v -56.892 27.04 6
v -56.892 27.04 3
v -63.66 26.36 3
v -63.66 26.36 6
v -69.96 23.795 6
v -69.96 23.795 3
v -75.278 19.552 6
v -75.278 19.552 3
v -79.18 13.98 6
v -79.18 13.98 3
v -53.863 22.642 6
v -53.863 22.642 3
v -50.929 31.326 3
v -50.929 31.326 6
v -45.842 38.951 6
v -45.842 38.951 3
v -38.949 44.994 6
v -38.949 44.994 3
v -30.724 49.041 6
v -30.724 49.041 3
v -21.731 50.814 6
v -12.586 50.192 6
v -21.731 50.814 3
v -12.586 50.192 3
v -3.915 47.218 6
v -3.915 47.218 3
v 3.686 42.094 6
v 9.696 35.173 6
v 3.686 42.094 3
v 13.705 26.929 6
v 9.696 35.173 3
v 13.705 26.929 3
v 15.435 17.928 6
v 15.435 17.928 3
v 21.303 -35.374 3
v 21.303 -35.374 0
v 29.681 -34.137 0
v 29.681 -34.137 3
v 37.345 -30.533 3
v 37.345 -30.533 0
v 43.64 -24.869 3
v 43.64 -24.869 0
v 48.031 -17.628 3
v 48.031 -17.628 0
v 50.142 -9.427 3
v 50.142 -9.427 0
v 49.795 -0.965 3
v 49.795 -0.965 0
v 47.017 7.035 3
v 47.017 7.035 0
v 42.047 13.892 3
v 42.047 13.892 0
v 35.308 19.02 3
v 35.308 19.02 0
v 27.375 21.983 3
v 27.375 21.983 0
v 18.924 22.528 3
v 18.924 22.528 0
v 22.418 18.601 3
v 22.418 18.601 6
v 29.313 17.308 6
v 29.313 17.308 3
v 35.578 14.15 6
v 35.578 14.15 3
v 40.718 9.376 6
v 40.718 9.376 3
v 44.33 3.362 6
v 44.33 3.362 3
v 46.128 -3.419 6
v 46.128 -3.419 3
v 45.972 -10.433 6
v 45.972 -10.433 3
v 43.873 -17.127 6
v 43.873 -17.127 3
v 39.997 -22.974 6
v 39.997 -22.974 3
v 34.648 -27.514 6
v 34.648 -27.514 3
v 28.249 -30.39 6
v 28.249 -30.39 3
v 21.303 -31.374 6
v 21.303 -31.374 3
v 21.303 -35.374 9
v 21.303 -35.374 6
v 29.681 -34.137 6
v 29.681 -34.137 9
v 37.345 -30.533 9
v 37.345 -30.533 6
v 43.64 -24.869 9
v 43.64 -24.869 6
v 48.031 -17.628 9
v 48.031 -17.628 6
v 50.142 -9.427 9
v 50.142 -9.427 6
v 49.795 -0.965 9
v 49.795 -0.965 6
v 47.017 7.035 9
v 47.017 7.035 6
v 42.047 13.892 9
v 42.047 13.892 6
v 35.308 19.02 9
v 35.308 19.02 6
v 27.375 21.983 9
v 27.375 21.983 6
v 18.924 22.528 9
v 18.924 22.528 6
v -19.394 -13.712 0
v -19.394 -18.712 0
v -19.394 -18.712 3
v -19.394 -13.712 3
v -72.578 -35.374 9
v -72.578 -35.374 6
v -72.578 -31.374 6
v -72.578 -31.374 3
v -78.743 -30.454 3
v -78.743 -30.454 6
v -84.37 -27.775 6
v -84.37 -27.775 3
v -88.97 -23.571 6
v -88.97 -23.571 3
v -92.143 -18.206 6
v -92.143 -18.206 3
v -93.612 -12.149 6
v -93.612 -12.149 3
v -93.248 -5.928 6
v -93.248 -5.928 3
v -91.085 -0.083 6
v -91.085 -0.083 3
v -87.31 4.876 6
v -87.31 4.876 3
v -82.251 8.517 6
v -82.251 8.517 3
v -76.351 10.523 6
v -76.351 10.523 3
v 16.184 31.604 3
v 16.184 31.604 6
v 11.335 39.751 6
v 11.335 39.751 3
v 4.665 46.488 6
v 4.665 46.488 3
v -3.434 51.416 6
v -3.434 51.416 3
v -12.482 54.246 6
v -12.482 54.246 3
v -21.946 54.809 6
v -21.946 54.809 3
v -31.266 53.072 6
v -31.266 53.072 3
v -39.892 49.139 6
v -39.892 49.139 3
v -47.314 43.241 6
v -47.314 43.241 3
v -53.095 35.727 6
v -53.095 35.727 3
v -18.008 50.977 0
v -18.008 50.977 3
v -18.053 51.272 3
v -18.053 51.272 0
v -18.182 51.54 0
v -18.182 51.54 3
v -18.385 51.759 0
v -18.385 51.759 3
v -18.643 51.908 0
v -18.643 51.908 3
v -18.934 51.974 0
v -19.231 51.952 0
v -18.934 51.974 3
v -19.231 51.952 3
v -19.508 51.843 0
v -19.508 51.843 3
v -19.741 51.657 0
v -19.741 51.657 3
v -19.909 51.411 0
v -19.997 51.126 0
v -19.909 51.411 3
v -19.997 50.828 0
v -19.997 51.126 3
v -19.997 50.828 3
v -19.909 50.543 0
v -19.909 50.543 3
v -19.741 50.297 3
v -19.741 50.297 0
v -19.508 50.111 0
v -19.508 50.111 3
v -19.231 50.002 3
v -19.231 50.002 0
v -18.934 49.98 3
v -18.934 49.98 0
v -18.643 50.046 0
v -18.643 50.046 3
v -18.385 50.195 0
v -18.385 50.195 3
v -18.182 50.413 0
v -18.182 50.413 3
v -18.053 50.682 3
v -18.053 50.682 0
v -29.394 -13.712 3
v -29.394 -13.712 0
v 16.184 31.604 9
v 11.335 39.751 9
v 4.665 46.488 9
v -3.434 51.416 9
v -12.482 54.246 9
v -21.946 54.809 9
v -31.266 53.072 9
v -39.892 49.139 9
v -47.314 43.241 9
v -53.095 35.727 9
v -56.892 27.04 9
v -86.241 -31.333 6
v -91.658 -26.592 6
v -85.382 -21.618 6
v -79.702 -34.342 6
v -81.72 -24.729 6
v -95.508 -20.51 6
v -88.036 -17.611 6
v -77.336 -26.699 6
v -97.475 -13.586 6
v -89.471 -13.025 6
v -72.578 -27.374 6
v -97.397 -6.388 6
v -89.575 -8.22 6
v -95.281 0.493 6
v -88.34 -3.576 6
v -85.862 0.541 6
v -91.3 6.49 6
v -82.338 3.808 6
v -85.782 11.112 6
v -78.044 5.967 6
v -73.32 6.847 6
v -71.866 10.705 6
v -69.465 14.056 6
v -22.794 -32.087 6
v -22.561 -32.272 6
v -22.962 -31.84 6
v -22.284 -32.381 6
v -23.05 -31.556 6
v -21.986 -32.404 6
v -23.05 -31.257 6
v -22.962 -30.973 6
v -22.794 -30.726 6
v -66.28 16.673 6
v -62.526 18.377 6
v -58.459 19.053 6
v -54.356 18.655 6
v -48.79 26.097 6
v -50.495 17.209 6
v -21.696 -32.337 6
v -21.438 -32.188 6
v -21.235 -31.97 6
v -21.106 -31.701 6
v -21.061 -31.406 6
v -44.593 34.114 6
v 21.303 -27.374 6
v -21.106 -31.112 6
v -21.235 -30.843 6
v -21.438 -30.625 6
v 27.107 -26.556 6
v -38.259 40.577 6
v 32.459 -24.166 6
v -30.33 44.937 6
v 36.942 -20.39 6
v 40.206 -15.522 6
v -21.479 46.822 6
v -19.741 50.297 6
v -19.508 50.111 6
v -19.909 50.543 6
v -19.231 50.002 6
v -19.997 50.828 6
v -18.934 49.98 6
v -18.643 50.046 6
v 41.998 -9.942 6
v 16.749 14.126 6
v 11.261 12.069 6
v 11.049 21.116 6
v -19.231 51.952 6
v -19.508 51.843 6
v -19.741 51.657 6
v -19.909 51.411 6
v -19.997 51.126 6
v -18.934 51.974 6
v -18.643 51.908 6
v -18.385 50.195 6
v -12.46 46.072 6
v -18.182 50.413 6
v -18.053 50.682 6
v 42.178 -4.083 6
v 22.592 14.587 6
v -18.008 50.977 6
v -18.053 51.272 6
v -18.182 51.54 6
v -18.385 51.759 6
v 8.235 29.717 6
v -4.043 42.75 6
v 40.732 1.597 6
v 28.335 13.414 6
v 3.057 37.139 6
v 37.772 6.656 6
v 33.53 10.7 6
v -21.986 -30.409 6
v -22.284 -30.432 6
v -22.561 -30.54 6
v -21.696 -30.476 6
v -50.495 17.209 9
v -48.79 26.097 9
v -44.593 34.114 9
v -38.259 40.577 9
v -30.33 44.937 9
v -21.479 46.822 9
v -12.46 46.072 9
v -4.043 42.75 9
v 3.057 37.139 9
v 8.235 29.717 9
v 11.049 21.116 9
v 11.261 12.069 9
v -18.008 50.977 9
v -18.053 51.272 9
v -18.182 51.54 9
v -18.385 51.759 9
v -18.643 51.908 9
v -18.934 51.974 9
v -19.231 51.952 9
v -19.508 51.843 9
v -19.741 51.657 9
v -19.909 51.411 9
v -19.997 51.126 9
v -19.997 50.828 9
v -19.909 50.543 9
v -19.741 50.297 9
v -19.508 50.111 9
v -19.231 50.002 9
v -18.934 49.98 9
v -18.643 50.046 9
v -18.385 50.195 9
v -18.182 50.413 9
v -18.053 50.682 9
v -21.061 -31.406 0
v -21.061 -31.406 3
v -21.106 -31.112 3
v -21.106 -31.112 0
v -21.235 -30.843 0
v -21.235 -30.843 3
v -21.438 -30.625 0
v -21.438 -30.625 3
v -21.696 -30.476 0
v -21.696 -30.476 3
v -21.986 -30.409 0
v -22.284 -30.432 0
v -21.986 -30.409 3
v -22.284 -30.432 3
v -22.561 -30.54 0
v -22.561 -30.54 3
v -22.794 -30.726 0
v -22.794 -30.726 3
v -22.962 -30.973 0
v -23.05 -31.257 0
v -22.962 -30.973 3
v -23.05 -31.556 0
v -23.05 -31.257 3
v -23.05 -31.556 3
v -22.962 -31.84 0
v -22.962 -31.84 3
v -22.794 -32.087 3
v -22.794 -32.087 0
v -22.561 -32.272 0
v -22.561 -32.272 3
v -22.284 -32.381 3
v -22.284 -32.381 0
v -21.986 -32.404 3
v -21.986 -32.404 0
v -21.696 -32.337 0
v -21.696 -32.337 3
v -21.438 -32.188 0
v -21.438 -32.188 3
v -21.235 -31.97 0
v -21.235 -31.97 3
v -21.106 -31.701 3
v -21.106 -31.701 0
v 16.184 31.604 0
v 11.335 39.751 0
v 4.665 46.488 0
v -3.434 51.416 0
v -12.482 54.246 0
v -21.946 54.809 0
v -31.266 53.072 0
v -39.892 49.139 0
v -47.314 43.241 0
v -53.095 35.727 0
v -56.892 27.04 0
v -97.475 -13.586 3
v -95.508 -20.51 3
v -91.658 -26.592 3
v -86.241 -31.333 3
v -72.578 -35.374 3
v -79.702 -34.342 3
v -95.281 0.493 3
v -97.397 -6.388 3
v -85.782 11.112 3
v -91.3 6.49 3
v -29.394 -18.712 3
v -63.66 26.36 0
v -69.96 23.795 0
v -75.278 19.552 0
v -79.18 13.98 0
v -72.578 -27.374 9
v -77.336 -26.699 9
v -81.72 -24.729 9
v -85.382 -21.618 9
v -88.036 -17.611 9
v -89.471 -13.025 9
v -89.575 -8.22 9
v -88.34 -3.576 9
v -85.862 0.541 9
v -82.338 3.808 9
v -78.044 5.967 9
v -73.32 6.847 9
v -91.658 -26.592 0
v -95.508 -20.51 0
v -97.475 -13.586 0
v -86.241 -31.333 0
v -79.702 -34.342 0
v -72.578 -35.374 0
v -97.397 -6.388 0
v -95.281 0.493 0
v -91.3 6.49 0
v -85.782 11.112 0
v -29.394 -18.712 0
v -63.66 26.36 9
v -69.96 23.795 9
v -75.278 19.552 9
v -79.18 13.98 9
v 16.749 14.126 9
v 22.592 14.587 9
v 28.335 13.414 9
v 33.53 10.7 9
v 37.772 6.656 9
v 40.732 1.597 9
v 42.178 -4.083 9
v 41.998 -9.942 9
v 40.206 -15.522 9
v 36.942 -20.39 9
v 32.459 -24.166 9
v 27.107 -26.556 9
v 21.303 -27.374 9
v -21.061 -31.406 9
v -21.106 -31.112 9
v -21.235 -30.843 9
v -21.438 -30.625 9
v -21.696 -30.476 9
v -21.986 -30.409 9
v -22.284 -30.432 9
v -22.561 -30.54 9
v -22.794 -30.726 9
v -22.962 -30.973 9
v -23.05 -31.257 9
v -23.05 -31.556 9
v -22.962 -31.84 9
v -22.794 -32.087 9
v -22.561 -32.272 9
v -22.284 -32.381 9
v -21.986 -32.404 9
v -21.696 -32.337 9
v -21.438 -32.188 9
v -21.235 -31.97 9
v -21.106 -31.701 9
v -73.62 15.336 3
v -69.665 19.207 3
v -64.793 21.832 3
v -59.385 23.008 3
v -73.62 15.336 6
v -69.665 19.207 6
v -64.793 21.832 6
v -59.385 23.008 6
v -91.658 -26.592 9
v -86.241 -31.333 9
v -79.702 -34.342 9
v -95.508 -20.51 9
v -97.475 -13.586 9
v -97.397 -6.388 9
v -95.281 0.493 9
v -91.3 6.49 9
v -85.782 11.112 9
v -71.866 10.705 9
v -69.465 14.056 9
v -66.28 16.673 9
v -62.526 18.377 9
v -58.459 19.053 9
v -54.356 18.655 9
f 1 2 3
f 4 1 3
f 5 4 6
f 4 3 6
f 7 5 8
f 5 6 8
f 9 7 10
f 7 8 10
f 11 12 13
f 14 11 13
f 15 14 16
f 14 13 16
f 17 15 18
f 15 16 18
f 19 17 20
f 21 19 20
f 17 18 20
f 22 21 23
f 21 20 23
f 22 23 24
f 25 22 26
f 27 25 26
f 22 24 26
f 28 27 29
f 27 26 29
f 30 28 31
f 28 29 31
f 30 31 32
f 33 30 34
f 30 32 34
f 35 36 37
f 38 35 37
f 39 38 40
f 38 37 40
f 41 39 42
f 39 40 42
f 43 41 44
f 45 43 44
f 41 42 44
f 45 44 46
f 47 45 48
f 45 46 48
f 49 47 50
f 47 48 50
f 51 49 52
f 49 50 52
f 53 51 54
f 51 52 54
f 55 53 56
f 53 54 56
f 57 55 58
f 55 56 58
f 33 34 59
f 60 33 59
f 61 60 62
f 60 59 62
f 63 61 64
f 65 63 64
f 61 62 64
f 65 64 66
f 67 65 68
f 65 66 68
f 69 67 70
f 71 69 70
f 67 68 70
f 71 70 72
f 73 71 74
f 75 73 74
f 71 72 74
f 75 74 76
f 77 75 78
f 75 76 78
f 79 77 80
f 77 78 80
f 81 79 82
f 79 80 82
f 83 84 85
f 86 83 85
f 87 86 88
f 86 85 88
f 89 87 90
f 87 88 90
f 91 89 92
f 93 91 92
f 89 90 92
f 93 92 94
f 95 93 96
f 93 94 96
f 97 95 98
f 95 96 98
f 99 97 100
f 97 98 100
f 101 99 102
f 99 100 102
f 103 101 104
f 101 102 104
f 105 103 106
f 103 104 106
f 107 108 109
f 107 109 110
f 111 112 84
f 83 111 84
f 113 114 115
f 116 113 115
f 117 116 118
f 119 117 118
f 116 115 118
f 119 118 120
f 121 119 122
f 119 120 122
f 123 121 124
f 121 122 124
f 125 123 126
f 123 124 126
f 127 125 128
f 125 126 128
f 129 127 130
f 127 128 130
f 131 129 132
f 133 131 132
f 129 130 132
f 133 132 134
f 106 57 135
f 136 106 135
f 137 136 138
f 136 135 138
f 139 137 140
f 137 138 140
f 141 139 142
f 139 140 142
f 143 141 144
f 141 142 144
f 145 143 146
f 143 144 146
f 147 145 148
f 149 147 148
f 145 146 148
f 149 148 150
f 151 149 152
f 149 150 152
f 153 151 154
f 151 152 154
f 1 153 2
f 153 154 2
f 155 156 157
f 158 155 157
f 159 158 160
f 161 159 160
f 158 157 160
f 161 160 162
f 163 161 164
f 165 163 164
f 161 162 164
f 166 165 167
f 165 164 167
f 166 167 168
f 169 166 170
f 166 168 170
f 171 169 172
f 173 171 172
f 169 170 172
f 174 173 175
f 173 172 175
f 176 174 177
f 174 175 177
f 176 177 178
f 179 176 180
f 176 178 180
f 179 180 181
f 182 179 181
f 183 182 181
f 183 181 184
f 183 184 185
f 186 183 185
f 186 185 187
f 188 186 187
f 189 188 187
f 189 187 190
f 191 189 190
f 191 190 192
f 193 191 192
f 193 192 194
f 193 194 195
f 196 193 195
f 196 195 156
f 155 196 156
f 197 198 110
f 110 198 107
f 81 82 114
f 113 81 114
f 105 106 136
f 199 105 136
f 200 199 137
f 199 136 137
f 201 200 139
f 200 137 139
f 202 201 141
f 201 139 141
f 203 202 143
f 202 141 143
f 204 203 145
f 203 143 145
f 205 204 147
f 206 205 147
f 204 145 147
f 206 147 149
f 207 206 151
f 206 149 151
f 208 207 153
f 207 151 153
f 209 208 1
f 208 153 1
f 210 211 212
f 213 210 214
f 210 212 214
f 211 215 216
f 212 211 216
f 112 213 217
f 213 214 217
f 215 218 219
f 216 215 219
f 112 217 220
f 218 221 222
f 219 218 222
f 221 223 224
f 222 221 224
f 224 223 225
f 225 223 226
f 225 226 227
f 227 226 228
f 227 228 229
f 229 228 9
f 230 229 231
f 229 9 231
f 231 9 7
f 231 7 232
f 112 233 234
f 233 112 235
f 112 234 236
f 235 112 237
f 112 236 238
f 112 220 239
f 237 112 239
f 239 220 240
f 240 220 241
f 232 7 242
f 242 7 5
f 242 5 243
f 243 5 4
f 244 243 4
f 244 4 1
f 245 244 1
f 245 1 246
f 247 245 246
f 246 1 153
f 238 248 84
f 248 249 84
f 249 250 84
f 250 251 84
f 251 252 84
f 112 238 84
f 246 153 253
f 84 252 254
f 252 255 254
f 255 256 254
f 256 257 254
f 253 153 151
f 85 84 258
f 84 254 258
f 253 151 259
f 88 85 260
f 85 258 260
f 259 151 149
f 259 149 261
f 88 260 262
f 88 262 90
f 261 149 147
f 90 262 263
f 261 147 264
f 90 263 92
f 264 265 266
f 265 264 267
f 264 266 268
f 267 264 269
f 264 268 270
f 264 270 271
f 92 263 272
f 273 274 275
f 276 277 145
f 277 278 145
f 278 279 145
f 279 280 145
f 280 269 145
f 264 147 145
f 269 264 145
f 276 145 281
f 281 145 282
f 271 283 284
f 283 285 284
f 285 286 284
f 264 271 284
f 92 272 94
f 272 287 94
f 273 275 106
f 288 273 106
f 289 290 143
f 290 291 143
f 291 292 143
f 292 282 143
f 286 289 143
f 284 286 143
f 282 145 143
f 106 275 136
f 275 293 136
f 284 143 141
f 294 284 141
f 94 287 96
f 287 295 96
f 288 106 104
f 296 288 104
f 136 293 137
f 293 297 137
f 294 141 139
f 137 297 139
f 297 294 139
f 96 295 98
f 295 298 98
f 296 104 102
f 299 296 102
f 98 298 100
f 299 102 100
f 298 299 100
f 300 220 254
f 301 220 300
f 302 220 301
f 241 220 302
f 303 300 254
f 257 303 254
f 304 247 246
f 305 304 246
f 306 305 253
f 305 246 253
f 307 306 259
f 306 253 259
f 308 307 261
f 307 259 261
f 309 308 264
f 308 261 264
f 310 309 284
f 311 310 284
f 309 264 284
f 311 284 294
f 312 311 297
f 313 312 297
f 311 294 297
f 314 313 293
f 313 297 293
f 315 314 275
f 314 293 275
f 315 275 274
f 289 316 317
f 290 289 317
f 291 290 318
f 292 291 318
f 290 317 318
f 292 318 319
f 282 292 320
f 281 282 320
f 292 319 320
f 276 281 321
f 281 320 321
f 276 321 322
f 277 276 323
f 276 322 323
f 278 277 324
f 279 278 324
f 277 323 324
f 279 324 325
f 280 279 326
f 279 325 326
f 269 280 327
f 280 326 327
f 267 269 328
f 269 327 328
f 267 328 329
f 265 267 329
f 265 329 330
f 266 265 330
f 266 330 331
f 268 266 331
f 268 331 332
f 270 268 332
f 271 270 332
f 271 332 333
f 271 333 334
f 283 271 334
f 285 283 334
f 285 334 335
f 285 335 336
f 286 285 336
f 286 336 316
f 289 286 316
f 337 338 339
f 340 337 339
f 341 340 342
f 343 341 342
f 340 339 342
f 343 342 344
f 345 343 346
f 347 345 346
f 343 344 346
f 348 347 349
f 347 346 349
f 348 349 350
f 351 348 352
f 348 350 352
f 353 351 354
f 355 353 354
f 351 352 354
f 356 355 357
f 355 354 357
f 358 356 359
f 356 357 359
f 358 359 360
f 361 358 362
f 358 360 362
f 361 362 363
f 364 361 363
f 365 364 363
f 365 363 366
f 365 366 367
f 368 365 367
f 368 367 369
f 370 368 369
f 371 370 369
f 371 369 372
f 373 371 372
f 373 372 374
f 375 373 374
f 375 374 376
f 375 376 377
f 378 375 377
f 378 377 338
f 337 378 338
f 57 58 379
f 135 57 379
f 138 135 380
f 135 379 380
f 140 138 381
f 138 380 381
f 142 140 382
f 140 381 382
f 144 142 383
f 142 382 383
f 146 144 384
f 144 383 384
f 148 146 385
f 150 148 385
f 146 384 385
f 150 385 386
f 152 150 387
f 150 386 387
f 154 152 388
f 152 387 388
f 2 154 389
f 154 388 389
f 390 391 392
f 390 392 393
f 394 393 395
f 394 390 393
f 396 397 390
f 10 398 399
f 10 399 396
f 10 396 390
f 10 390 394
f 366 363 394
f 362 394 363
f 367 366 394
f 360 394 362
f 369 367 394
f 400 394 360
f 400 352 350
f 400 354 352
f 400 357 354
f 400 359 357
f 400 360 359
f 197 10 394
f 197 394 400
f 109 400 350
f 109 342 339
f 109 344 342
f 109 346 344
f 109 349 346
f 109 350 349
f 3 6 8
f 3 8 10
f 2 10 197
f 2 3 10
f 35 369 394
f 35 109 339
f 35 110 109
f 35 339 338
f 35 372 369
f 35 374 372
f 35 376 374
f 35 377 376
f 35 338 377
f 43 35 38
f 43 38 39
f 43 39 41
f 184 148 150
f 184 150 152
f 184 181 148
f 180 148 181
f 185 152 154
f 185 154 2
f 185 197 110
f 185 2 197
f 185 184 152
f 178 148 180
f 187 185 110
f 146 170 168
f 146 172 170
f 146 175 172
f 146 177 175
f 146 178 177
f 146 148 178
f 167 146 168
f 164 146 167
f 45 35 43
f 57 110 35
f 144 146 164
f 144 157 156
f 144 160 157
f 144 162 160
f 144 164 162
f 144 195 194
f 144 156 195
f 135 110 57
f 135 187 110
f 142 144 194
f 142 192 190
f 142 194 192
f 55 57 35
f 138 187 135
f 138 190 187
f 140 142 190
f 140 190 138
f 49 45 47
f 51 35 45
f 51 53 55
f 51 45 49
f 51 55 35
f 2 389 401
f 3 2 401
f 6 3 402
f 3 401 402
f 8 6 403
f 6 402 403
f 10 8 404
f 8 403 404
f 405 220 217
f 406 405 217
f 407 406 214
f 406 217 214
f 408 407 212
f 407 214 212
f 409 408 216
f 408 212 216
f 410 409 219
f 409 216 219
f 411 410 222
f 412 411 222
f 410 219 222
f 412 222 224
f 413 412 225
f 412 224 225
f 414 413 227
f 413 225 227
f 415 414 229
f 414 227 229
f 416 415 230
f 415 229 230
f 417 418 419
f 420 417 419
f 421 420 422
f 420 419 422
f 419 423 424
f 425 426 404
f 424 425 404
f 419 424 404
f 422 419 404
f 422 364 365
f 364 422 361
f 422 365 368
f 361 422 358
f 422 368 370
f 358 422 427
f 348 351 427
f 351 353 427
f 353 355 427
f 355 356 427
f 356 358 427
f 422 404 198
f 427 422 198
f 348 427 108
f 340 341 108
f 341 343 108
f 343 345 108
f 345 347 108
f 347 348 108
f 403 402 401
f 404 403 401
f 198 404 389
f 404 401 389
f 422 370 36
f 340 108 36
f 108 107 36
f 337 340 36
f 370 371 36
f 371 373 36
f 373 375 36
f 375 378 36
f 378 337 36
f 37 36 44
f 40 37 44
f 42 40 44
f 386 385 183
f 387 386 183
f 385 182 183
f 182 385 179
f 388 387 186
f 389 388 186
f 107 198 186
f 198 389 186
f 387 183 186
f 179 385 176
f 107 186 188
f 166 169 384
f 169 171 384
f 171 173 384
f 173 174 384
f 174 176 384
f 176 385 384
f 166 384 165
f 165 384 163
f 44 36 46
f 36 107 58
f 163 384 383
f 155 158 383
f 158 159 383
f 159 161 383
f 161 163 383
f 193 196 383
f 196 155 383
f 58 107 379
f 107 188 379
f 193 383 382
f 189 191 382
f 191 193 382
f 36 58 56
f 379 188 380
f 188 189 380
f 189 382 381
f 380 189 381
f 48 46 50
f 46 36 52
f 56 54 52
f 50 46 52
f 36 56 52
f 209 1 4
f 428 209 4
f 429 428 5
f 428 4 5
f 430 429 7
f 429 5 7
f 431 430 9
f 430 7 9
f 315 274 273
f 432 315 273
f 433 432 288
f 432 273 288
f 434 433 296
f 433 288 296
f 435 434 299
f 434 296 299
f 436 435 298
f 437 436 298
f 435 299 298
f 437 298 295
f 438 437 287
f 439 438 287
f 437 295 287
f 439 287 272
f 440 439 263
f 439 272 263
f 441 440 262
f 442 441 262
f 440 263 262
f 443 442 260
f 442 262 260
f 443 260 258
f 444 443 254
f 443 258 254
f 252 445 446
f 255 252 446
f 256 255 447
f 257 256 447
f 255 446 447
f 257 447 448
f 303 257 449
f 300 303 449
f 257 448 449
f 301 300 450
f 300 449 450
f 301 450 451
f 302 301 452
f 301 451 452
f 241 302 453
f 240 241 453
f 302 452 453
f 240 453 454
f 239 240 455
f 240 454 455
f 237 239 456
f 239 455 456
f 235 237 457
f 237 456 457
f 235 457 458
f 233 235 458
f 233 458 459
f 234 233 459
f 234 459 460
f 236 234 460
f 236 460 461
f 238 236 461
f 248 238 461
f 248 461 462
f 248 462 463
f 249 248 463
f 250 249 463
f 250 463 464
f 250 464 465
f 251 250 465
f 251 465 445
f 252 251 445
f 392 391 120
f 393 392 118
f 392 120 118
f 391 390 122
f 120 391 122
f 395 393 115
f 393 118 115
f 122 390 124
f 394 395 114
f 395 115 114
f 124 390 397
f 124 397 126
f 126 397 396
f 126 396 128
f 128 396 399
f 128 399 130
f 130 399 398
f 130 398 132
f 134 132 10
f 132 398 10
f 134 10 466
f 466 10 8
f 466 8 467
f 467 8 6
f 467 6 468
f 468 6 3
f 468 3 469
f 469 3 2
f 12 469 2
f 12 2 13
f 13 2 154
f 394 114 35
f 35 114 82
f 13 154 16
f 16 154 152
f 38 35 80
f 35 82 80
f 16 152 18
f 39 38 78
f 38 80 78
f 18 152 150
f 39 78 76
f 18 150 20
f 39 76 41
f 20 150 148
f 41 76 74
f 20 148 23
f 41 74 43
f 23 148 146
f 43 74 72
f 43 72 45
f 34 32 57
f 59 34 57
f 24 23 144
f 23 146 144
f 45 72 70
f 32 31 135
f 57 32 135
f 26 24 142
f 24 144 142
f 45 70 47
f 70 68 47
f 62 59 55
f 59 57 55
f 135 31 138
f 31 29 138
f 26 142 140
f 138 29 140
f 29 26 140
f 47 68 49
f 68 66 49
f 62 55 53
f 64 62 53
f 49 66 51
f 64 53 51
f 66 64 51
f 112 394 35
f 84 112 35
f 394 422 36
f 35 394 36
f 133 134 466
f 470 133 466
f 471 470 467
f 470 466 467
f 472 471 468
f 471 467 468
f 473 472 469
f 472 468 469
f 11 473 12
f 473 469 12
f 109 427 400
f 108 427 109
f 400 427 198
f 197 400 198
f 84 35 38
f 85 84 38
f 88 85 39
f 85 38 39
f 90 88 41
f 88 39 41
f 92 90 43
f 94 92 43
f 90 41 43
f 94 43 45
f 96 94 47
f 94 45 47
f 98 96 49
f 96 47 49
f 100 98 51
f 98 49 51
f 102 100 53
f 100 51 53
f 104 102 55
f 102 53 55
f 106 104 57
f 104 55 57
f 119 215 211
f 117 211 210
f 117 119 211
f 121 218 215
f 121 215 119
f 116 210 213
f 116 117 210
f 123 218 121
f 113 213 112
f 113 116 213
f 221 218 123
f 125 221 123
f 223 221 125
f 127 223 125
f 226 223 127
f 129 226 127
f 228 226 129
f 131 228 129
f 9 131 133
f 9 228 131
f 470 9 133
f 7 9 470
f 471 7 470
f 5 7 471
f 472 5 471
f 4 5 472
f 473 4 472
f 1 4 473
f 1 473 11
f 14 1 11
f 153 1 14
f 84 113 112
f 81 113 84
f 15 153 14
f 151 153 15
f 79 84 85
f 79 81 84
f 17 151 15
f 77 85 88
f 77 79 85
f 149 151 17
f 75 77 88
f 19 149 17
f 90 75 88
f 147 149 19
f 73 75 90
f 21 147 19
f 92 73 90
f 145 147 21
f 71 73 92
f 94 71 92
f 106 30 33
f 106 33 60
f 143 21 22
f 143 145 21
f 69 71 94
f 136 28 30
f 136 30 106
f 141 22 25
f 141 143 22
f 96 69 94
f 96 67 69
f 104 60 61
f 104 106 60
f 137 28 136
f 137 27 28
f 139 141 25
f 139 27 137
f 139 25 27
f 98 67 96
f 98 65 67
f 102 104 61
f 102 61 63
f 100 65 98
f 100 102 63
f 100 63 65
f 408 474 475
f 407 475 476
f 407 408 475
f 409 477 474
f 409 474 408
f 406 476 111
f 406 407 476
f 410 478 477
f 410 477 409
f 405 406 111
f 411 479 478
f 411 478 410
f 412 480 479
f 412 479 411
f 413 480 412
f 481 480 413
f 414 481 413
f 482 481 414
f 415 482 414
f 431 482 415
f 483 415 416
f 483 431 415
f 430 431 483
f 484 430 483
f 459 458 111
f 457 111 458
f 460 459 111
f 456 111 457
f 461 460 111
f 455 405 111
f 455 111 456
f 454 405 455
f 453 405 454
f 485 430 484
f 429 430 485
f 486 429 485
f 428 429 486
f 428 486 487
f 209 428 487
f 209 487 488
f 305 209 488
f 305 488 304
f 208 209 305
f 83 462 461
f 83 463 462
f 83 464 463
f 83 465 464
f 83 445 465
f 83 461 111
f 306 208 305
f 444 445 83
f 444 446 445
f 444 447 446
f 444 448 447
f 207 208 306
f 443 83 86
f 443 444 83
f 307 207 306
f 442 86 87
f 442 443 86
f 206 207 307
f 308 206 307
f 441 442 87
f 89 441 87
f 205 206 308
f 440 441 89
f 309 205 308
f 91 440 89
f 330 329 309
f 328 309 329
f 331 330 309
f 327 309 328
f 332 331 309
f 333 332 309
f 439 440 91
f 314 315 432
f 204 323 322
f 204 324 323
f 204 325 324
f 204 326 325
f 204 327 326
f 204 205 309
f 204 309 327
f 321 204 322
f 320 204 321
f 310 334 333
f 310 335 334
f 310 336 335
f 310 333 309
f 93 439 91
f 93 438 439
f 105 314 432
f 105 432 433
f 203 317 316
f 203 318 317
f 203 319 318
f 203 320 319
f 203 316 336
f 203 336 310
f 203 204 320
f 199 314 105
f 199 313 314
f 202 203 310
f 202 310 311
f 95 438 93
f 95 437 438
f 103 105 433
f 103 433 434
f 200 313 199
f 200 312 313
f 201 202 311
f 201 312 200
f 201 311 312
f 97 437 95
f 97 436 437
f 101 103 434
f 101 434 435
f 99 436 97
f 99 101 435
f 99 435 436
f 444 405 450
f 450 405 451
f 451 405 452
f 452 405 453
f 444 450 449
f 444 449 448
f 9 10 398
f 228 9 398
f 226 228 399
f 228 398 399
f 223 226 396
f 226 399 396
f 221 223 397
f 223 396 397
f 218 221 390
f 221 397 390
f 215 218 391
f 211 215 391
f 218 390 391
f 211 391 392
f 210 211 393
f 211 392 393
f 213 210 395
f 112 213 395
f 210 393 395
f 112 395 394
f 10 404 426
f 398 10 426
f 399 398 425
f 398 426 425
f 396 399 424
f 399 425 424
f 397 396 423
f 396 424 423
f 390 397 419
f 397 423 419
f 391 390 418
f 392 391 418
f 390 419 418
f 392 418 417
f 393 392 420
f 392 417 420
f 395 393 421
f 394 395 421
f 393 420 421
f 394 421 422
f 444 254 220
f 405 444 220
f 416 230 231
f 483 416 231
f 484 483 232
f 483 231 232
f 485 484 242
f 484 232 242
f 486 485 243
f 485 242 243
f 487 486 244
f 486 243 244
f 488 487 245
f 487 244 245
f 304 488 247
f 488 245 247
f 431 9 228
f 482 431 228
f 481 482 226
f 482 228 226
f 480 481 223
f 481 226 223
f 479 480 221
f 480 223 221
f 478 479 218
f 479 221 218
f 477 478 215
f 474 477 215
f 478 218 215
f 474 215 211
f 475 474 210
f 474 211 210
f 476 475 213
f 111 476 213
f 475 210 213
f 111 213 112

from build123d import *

# Parameters (mm, degrees)
F1_W     = 10
F1_H     = 5
F2_DEPTH = 3
F4_DEPTH = 3
F6_DEPTH = 3
F7_R     = 1
F8_DEPTH = 9.001


with BuildPart() as f2:
    # F1 (on Top) → F2 (new body)
    with BuildSketch(Plane.XY):
        with BuildLine():
            ThreePointArc((18.9239778624, 22.528357261), (-17.196872912, 54.8158089274), (-56.8917024575, 27.0396338283))
            ThreePointArc((-56.8917024575, 27.0396338283), (-69.9604581217, 23.7945983478), (-79.1795119252, 13.9797281576))
            ThreePointArc((-79.1795119252, 13.9797281576), (-97.4749227856, -13.5855716738), (-72.5783757035, -35.3738657037))
            Line((-72.5783757035, -35.3738657037), (21.3033701587, -35.3738657037))
            ThreePointArc((21.3033701587, -35.3738657037), (50.2789155891, -5.1831654845), (18.9239778624, 22.528357261))
        make_face()
        with Locations((-24.3944358081, -16.2119916081)):
            Rectangle(F1_W, F1_H, mode=Mode.SUBTRACT)
    extrude(amount=F2_DEPTH)


with BuildPart() as f4:
    # F3 (on face) → F4 (new body)
    with BuildSketch(Plane.XY.offset(3)):
        with BuildLine():
            ThreePointArc((21.3033701587, -35.3738657037), (50.2789155891, -5.1831654845), (18.9239778624, 22.528357261))
            ThreePointArc((18.9239778624, 22.528357261), (-17.196872912, 54.8158089274), (-56.8917024575, 27.0396338283))
            ThreePointArc((-56.8917024575, 27.0396338283), (-69.9604581217, 23.7945983478), (-79.1795119252, 13.9797281576))
            ThreePointArc((-79.1795119252, 13.9797281576), (-97.4749227856, -13.5855716738), (-72.5783757035, -35.3738657037))
            Line((-72.5783757035, -35.3738657037), (21.3033701587, -35.3738657037))
        make_face()
        with BuildLine():
            ThreePointArc((-76.3507281586, 10.522983545), (-67.3209277766, 20.6904762333), (-53.8633061169, 22.641789065))
            ThreePointArc((-53.8633061169, 22.641789065), (-17.1379062519, 50.8039618254), (15.4353030162, 17.9276936704))
            ThreePointArc((15.4353030162, 17.9276936704), (46.1281459316, -3.4191224282), (21.3033701587, -31.3738657037))
            Line((21.3033701587, -31.3738657037), (-72.5783757035, -31.3738657037))
            ThreePointArc((-72.5783757035, -31.3738657037), (-93.6115436771, -12.149418004), (-76.3507281586, 10.522983545))
        make_face(mode=Mode.SUBTRACT)
    extrude(amount=F4_DEPTH)


with BuildPart() as f6:
    # F5 (on face) → F6 (new body)
    with BuildSketch(Plane.XY.offset(6)):
        with BuildLine():
            ThreePointArc((18.9239778624, 22.528357261), (-17.196872912, 54.8158089274), (-56.8917024575, 27.0396338283))
            ThreePointArc((-56.8917024575, 27.0396338283), (-69.9604581217, 23.7945983478), (-79.1795119252, 13.9797281576))
            ThreePointArc((-79.1795119252, 13.9797281576), (-97.4749227856, -13.5855716738), (-72.5783757035, -35.3738657037))
            Line((-72.5783757035, -35.3738657037), (21.3033701587, -35.3738657037))
            ThreePointArc((21.3033701587, -35.3738657037), (50.2789155891, -5.1831654845), (18.9239778624, 22.528357261))
        make_face()
        with BuildLine():
            ThreePointArc((-73.3195503129, 6.846589606), (-64.4585036261, 17.6475443755), (-50.494744269, 17.2091416674))
            ThreePointArc((-50.494744269, 17.2091416674), (-16.9420148184, 46.7778414524), (11.2610857029, 12.0693586052))
            ThreePointArc((11.2610857029, 12.0693586052), (41.6541405432, -1.1925391596), (21.3033701587, -27.3738657037))
            Line((21.3033701587, -27.3738657037), (-72.5783757035, -27.3738657037))
            ThreePointArc((-72.5783757035, -27.3738657037), (-89.6926161293, -10.6262857825), (-73.3195503129, 6.846589606))
        make_face(mode=Mode.SUBTRACT)
    extrude(amount=F6_DEPTH)


with BuildPart() as f8_tool:
    # F7 (on face) → F8 (new body, through all)
    with BuildSketch(Plane.XY.offset(9)):
        with Locations((-22.0611357199, -31.4064599472)):
            Circle(F7_R)
        with Locations((-19.0083511606, 50.9767510554)):
            Circle(F7_R)
    extrude(amount=-F8_DEPTH)


with BuildPart() as f2_1:
    add(f2.part)

    # F8: cut by f8_tool
    add(f8_tool.part, mode=Mode.SUBTRACT)


with BuildPart() as f6_1:
    add(f6.part)

    # F8: cut by f8_tool
    add(f8_tool.part, mode=Mode.SUBTRACT)


solid = Compound([f4.part, f2_1.part, f6_1.part])
